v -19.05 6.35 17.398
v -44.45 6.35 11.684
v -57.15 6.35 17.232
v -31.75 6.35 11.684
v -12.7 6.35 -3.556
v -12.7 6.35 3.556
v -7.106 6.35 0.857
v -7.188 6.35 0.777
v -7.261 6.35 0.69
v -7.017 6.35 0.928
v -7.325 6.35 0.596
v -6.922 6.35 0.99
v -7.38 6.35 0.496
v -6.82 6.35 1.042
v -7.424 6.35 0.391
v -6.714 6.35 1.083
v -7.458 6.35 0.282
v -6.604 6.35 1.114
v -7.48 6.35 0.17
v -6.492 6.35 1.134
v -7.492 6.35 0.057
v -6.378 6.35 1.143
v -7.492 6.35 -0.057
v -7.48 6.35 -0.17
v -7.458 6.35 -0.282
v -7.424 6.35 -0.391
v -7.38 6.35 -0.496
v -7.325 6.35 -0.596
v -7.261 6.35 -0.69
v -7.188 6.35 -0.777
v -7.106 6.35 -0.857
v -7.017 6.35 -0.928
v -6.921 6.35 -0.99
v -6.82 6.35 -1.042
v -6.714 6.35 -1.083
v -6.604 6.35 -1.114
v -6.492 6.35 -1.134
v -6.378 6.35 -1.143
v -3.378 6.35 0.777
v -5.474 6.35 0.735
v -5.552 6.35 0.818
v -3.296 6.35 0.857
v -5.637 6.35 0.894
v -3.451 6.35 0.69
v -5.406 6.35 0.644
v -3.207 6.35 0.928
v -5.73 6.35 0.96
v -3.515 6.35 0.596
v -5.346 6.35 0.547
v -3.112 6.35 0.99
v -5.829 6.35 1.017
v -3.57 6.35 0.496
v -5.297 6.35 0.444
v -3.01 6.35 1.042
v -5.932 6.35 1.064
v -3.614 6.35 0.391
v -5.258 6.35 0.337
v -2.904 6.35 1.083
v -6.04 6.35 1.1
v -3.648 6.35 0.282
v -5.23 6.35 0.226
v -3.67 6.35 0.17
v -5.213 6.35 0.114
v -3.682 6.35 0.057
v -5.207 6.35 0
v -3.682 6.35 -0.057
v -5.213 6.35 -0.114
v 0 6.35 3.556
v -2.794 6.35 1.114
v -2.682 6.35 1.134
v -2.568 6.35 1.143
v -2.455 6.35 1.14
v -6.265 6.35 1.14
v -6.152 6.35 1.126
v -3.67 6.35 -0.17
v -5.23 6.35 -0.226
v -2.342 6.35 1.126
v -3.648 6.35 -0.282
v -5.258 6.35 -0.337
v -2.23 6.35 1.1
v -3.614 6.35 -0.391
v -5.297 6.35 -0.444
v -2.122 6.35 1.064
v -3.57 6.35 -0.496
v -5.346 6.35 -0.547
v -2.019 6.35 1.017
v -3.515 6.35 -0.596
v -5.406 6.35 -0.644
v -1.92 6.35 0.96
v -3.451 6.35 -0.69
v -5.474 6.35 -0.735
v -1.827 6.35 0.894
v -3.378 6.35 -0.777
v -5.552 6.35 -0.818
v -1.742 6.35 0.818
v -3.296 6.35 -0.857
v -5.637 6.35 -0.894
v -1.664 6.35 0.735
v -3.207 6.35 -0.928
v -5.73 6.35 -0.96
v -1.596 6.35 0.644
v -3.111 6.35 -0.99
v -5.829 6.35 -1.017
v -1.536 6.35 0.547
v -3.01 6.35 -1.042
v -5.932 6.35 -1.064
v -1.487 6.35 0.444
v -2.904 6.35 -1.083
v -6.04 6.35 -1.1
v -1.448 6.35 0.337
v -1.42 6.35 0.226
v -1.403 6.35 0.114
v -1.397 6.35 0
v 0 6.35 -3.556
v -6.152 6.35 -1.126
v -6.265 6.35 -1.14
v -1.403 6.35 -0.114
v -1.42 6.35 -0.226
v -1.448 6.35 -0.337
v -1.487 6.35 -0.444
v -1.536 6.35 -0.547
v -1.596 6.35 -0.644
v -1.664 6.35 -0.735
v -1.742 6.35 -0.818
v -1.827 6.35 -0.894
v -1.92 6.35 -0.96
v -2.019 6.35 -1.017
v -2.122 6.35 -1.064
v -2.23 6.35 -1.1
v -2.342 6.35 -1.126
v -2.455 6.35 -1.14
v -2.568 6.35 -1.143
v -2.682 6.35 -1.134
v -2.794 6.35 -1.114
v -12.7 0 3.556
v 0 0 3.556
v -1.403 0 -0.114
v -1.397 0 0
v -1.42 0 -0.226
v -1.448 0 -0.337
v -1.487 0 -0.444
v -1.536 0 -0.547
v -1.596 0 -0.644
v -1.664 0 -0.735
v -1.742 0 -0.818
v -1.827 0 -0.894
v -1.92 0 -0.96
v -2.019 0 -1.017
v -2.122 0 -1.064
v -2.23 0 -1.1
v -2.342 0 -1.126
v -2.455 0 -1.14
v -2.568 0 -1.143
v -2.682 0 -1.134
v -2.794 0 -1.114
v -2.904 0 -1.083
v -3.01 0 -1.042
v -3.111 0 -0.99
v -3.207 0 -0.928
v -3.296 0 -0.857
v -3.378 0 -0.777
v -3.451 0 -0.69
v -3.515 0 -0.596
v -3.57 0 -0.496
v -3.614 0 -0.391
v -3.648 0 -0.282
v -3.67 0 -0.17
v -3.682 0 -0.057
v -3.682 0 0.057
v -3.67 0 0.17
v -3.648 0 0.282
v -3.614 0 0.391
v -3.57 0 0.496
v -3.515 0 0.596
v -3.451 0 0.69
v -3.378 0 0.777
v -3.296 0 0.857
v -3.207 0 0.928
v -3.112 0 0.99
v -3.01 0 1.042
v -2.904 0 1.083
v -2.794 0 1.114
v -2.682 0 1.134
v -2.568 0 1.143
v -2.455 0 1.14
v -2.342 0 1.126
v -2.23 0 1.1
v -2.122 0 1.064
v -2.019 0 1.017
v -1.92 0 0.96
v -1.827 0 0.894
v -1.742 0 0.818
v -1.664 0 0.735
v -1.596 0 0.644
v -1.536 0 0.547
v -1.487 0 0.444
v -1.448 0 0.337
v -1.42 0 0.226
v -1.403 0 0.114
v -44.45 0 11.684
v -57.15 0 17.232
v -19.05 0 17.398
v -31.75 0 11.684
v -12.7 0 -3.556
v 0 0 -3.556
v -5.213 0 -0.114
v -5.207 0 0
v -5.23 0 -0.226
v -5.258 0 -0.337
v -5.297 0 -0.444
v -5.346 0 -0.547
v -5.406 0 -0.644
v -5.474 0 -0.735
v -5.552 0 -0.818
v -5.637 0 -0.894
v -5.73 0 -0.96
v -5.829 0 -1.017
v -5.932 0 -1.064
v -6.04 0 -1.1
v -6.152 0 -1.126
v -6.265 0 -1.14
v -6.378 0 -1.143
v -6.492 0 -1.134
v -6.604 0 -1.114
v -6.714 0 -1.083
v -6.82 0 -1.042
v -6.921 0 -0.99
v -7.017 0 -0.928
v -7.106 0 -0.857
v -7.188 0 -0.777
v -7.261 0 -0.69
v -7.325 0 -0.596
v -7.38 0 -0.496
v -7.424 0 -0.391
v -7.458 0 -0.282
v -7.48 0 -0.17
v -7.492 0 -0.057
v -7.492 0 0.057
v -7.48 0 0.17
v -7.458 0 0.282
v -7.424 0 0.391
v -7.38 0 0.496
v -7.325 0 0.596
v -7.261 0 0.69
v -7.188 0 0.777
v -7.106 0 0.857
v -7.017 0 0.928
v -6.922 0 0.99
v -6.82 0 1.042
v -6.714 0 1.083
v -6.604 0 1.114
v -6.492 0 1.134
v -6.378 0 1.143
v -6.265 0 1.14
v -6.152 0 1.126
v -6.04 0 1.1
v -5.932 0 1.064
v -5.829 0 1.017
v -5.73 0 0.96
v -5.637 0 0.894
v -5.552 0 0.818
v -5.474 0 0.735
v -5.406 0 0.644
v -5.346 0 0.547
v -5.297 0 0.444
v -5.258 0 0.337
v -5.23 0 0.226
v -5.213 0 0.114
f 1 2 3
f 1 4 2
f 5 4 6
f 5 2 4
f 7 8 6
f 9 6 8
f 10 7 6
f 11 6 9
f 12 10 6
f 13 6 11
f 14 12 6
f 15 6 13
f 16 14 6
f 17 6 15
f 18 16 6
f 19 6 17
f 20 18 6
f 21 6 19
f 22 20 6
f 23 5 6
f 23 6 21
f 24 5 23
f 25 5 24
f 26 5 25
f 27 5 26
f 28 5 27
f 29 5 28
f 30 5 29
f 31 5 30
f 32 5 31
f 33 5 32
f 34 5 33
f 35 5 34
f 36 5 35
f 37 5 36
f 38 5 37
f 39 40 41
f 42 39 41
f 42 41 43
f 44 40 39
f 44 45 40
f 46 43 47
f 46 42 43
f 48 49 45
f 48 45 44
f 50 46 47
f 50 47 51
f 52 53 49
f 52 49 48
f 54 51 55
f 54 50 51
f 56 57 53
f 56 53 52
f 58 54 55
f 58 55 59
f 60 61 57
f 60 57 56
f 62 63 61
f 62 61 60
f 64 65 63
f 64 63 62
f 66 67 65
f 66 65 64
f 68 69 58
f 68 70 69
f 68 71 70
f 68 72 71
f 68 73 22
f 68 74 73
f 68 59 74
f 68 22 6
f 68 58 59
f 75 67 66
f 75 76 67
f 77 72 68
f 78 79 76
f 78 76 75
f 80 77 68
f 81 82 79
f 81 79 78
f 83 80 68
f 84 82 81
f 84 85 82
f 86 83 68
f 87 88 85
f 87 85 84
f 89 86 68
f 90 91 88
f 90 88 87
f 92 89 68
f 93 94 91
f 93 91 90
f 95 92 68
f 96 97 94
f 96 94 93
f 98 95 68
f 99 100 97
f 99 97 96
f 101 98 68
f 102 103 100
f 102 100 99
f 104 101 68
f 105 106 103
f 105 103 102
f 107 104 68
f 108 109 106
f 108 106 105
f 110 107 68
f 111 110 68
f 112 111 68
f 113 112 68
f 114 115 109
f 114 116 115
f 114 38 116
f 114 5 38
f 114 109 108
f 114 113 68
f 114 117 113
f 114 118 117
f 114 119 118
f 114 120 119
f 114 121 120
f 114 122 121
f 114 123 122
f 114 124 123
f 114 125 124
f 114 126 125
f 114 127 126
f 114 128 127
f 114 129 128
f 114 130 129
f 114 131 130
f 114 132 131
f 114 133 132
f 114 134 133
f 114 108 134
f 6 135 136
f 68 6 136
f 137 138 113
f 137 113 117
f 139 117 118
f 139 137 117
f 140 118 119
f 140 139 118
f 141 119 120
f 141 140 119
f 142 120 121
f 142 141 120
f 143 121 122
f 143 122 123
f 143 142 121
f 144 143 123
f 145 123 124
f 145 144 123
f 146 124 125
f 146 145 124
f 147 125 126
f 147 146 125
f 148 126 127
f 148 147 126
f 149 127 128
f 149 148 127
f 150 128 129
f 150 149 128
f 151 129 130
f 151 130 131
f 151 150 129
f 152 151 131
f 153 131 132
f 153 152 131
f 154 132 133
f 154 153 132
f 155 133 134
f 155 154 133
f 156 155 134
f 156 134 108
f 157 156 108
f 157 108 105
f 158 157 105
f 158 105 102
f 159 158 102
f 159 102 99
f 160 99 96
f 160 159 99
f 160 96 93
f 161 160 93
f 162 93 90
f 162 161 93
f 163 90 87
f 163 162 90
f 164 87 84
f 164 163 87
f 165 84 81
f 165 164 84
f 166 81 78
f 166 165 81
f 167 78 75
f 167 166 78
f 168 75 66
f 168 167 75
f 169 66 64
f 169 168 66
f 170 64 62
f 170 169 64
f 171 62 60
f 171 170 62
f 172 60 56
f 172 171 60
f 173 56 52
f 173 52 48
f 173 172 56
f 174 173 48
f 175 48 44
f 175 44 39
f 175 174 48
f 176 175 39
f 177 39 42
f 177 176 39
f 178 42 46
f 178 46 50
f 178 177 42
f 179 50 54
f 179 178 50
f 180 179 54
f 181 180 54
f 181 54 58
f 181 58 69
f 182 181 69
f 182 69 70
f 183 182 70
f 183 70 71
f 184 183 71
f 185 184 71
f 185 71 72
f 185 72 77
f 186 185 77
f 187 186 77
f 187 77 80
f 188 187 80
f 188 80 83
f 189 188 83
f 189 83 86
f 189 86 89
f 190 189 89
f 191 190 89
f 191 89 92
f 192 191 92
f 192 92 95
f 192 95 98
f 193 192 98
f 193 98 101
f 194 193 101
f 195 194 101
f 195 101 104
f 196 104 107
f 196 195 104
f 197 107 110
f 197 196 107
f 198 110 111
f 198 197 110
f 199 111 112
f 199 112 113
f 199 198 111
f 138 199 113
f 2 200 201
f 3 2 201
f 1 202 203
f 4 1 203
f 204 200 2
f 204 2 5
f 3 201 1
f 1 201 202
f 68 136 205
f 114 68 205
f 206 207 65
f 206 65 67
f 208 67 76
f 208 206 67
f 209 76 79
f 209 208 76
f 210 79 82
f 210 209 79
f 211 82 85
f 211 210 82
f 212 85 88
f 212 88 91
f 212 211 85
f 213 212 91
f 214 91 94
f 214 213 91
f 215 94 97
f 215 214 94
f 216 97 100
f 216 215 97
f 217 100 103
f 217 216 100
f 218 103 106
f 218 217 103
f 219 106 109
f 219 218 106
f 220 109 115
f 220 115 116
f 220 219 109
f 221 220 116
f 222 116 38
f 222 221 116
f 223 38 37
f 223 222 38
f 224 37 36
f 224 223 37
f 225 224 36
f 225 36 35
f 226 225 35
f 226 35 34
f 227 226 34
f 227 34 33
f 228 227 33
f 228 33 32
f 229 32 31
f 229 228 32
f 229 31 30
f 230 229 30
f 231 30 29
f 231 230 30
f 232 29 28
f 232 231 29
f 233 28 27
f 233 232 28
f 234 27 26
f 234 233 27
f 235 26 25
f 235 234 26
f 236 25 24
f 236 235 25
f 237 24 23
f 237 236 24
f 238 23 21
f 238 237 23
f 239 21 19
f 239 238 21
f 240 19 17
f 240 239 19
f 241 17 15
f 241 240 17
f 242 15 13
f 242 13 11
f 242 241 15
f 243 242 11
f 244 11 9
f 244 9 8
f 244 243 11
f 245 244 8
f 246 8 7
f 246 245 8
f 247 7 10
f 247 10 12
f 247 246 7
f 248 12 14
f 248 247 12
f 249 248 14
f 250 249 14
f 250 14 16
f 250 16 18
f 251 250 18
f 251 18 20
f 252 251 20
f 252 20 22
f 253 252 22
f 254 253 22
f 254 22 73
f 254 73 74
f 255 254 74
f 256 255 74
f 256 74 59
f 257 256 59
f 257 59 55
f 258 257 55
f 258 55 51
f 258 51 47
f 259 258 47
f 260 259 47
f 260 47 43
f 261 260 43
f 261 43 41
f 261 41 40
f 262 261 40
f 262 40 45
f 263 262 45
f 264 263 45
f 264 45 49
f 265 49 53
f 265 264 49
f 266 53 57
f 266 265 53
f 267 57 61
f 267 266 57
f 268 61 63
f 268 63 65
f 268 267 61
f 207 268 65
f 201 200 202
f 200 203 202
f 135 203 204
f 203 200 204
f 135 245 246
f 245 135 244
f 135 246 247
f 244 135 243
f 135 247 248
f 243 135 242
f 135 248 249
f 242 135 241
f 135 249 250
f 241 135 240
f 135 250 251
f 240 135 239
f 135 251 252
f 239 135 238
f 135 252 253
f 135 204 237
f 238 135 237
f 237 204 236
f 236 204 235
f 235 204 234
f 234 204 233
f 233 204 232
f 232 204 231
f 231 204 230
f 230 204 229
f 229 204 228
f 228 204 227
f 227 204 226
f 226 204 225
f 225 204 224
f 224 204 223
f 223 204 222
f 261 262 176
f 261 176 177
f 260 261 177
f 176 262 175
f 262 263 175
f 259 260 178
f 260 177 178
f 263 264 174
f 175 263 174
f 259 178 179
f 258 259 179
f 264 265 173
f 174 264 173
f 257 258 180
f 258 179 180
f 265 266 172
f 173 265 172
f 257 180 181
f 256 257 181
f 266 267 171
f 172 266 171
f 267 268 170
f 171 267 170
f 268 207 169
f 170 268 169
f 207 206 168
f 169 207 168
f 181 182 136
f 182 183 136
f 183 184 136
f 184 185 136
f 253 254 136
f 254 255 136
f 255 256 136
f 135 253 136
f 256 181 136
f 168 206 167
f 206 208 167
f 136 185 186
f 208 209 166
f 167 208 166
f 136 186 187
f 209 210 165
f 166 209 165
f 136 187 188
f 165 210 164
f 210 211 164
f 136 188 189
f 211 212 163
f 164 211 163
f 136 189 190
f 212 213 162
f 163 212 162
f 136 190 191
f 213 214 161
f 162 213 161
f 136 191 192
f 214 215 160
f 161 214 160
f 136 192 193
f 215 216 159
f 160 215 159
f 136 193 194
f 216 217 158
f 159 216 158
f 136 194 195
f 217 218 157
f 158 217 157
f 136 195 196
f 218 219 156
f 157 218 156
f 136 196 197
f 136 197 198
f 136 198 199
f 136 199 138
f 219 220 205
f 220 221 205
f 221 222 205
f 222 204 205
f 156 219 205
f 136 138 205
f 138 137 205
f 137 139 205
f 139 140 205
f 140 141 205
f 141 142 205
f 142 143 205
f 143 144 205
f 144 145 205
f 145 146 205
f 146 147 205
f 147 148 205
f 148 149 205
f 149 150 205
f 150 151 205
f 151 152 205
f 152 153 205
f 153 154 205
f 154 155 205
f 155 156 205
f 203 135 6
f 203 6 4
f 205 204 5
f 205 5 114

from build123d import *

# Parameters (mm, degrees)
SKETCH2_W           = 12.7
SKETCH2_H           = 7.112
SKETCH2_R           = 1.143
BOSS_EXTRUDE1_DEPTH = 6.35
BOSS_EXTRUDE2_DEPTH = 6.35


with BuildPart() as part:
    # Sketch2 → Boss-Extrude1 (new body)
    with BuildSketch(Plane(origin=(0, 0, 0), x_dir=(1, 0, 0), z_dir=(0, 1, 0))):
        Polygon((-12.7, -3.556), (-31.75, -11.684), (-44.45, -11.684), (-12.7, 3.556), align=None)
        with Locations((-6.35, 0)):
            Rectangle(SKETCH2_W, SKETCH2_H)
        with Locations((-6.35, 0)):
            Circle(SKETCH2_R, mode=Mode.SUBTRACT)
        with Locations((-2.54, 0)):
            Circle(SKETCH2_R, mode=Mode.SUBTRACT)
    extrude(amount=BOSS_EXTRUDE1_DEPTH)

    # Sketch3 → Boss-Extrude2 (add)
    with BuildSketch(Plane(origin=(0, 0, 0), x_dir=(1, 0, 0), z_dir=(0, 1, 0))):
        Polygon((-44.45, -11.684), (-57.15, -17.231593434), (-19.05, -17.3978371), (-31.75, -11.684), align=None)
    extrude(amount=BOSS_EXTRUDE2_DEPTH)


solid = part.part
